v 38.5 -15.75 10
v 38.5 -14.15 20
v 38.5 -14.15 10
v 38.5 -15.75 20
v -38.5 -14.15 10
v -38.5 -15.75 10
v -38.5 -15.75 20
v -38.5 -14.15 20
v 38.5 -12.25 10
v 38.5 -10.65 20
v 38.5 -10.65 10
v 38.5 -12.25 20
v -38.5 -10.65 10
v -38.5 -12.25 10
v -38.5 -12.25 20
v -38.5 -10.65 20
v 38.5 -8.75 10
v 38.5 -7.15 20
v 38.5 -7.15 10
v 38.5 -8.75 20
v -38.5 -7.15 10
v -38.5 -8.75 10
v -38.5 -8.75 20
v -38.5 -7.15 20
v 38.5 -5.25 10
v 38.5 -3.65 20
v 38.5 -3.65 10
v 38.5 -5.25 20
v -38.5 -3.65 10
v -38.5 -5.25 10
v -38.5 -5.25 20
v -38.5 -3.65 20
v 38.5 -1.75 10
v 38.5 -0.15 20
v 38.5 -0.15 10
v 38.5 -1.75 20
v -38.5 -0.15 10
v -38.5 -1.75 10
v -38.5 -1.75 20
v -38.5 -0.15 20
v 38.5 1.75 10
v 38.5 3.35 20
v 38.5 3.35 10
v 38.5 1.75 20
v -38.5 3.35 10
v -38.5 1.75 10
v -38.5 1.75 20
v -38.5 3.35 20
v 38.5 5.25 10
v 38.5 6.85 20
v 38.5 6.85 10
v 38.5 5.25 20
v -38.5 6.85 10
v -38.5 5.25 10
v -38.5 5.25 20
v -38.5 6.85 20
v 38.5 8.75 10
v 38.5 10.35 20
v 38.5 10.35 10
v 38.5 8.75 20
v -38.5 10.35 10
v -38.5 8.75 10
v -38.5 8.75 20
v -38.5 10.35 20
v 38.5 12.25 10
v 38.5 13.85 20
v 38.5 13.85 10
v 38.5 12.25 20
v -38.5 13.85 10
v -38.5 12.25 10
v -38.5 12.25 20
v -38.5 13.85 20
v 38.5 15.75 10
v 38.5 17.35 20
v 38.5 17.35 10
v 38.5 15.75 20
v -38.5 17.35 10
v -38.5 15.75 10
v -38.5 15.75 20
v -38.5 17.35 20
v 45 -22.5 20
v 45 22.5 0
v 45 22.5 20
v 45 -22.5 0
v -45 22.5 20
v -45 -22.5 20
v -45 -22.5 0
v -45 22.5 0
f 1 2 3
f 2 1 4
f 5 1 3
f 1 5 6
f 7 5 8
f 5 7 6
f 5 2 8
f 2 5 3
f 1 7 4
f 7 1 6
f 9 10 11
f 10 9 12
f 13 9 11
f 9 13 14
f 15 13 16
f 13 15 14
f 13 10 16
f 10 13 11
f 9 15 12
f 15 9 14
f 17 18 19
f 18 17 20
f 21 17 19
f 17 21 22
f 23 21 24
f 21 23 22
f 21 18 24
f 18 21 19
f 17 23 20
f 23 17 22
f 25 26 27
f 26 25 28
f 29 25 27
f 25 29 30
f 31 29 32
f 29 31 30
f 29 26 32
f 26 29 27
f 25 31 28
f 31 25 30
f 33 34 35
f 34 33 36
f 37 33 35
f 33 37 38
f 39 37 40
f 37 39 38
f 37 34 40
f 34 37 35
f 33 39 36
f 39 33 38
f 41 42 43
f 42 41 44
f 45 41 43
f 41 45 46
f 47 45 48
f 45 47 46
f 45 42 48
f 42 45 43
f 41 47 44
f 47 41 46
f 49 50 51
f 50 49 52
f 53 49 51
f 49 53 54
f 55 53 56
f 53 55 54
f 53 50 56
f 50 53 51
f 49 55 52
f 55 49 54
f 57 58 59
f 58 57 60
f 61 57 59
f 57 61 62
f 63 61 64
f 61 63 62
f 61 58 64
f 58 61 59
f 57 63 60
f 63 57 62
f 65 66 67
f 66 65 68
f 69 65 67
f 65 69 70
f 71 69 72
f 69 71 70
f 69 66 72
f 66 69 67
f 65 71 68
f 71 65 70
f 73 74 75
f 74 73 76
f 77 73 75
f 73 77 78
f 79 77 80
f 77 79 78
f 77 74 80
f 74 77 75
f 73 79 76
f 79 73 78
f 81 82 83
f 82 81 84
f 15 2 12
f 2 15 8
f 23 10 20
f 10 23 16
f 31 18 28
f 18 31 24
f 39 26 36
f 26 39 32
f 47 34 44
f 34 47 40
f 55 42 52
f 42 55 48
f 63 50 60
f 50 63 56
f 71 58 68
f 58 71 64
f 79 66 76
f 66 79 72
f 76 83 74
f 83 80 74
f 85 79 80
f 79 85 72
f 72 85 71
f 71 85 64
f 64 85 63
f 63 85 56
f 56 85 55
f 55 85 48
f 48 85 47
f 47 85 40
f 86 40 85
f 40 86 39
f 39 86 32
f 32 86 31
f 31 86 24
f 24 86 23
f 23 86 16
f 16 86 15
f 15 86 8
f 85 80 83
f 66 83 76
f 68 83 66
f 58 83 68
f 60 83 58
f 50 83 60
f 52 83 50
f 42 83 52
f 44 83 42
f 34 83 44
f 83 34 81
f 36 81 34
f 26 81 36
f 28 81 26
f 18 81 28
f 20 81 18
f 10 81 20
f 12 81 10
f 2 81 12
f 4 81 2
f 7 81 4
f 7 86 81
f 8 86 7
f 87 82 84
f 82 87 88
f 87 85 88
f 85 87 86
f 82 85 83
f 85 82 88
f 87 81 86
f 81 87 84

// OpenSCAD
// Slide drying rack - holds 10 microscope slides standing upright on their long edge
// Print orientation: base block on the bed (z = 0), slots open upward (+Z)

// ---------------- Parameters ----------------
block_len    = 90;    // base block length along X (mm)
block_wid    = 45;    // base block width along Y (mm)
block_ht     = 20;    // base block height along Z (mm)

slot_count   = 10;    // number of slide slots
slot_len     = 77;    // slot length along X (mm)
slot_w       = 1.6;   // slot width along Y (mm)
slot_depth   = 10;    // slot depth into the block (mm)

slot_pitch   = 3.5;   // centre-to-centre spacing of slots along Y (mm)

eps          = 0.5;   // overshoot of cutters past the top face (mm)

$fn = 96;

// ---------------- Model ----------------
difference() {
    // Solid base block, centred in X and Y, resting on z = 0
    translate([-block_len/2, -block_wid/2, 0])
        cube([block_len, block_wid, block_ht]);

    // Row of parallel slots, centred on the block in X and Y
    for (i = [0 : slot_count - 1]) {
        y = (i - (slot_count - 1)/2) * slot_pitch;
        translate([-slot_len/2, y, block_ht - slot_depth])
            cube([slot_len, slot_w, slot_depth + eps]);
    }
}
